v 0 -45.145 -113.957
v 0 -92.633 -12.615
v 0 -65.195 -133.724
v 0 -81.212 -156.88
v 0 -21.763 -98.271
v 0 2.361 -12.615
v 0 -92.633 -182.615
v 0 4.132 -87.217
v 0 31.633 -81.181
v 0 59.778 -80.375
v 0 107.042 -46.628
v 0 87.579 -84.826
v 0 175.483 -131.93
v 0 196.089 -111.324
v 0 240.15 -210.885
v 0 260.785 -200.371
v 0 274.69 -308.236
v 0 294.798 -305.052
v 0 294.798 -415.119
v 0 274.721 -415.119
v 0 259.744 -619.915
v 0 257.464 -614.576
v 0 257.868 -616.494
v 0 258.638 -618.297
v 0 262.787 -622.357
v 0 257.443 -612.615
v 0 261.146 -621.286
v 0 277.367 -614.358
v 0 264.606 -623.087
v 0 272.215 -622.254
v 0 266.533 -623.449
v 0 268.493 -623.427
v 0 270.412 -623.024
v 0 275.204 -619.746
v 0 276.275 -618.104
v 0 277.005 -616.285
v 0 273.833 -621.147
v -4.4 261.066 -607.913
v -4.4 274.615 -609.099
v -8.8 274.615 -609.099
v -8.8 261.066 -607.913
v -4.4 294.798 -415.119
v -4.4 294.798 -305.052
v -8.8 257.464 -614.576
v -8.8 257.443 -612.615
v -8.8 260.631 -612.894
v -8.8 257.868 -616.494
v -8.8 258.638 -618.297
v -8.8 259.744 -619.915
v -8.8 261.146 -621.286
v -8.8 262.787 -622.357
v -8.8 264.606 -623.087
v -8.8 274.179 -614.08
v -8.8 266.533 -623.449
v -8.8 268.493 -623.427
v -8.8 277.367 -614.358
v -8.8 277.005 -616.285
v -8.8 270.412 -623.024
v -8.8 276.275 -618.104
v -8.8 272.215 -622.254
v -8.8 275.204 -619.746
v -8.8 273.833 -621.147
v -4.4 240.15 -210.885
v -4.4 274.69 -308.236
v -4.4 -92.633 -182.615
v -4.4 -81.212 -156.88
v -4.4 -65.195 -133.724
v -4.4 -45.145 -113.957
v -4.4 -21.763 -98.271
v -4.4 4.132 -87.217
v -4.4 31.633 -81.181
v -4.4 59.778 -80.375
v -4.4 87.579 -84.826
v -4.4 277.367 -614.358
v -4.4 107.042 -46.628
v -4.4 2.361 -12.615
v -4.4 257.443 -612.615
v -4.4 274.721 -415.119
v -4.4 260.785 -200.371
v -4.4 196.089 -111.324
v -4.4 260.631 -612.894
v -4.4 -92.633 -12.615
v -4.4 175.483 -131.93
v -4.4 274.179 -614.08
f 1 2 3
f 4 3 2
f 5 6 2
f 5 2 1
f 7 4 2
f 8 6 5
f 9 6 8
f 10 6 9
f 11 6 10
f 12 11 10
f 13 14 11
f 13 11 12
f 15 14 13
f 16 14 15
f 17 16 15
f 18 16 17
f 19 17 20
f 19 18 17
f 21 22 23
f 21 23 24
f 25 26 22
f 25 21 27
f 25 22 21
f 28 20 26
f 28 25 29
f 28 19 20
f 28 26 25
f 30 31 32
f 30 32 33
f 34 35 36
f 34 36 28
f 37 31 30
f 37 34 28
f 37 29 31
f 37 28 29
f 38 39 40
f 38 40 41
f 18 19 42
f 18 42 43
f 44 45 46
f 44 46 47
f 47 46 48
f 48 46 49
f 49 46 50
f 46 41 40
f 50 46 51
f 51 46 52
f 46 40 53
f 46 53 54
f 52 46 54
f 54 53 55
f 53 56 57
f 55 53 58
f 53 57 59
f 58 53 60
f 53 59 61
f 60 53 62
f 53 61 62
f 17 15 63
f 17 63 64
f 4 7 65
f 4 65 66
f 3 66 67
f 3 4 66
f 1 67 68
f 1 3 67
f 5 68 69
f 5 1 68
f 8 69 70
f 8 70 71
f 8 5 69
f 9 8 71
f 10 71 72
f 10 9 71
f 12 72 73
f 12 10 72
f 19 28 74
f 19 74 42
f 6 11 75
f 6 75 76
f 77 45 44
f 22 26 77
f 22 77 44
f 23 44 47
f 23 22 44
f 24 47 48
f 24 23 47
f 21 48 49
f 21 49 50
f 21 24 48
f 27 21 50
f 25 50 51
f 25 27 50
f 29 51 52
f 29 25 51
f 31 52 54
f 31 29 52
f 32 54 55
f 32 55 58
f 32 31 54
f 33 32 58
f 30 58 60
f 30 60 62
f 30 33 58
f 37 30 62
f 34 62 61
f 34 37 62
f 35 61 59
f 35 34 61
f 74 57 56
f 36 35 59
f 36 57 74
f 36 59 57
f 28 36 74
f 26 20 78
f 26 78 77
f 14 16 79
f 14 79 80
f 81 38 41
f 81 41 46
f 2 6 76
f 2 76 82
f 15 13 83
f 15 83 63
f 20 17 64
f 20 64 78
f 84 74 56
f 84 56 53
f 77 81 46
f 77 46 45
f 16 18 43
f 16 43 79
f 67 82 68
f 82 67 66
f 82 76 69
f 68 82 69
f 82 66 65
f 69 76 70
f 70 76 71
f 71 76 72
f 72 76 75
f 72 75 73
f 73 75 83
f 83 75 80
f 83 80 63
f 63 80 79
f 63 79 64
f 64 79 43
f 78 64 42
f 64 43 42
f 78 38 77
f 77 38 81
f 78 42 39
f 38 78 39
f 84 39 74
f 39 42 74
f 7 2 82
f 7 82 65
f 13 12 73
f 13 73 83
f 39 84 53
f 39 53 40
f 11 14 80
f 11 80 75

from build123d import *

# Parameters (mm, degrees)
BOSS_EXTRUDE1_DEPTH = 4.4
BOSS_EXTRUDE2_DEPTH = 4.4


with BuildPart() as part:
    # Sketch1 → Boss-Extrude1 (new body)
    with BuildSketch(Plane(origin=(0, 0, 0), x_dir=(0, 0, -1), z_dir=(1, 0, 0))):
        with BuildLine():
            Line((12.615293263, -92.633282396), (182.615293263, -92.633282396))
            ThreePointArc((182.615293263, -92.633282396), (98.271459614, -21.762843967), (84.825943994, 87.579368501))
            Line((84.825943994, 87.579368501), (131.929787104, 175.483372313))
            Line((131.929787104, 175.483372313), (210.884858569, 240.150484061))
            Line((210.884858569, 240.150484061), (308.236471933, 274.689971372))
            Line((308.236471933, 274.689971372), (415.1194685, 274.721469403))
            Line((415.1194685, 274.721469403), (612.615293263, 257.442823643))
            ThreePointArc((612.615293263, 257.442823643), (623.448797672, 266.533213196), (614.358408118, 277.366717604))
            Line((614.358408118, 277.366717604), (415.1194685, 294.797866154))
            Line((415.1194685, 294.797866154), (305.051694272, 294.797866154))
            Line((305.051694272, 294.797866154), (200.371020359, 260.785053385))
            Line((200.371020359, 260.785053385), (111.324320476, 196.088838941))
            Line((111.324320476, 196.088838941), (46.628106033, 107.042139058))
            Line((46.628106033, 107.042139058), (12.615293263, 2.361465145))
            Line((12.615293263, 2.361465145), (12.615293263, -92.633282396))
        make_face()
    extrude(amount=-BOSS_EXTRUDE1_DEPTH)

    # Sketch2 → Boss-Extrude2 (add)
    with BuildSketch(Plane.ZY.offset(4.4)):
        with BuildLine():
            Line((-614.358408118, 277.366717604), (-614.079509741, 274.178894571))
            Line((-614.079509741, 274.178894571), (-609.098536251, 274.614673284))
            Line((-609.098536251, 274.614673284), (-607.91321815, 261.06642539))
            Line((-607.91321815, 261.06642539), (-612.89419164, 260.630646676))
            Line((-612.89419164, 260.630646676), (-612.615293263, 257.442823643))
            ThreePointArc((-612.615293263, 257.442823643), (-623.448797672, 266.533213196), (-614.358408118, 277.366717604))
        make_face()
    extrude(amount=BOSS_EXTRUDE2_DEPTH)


solid = part.part
